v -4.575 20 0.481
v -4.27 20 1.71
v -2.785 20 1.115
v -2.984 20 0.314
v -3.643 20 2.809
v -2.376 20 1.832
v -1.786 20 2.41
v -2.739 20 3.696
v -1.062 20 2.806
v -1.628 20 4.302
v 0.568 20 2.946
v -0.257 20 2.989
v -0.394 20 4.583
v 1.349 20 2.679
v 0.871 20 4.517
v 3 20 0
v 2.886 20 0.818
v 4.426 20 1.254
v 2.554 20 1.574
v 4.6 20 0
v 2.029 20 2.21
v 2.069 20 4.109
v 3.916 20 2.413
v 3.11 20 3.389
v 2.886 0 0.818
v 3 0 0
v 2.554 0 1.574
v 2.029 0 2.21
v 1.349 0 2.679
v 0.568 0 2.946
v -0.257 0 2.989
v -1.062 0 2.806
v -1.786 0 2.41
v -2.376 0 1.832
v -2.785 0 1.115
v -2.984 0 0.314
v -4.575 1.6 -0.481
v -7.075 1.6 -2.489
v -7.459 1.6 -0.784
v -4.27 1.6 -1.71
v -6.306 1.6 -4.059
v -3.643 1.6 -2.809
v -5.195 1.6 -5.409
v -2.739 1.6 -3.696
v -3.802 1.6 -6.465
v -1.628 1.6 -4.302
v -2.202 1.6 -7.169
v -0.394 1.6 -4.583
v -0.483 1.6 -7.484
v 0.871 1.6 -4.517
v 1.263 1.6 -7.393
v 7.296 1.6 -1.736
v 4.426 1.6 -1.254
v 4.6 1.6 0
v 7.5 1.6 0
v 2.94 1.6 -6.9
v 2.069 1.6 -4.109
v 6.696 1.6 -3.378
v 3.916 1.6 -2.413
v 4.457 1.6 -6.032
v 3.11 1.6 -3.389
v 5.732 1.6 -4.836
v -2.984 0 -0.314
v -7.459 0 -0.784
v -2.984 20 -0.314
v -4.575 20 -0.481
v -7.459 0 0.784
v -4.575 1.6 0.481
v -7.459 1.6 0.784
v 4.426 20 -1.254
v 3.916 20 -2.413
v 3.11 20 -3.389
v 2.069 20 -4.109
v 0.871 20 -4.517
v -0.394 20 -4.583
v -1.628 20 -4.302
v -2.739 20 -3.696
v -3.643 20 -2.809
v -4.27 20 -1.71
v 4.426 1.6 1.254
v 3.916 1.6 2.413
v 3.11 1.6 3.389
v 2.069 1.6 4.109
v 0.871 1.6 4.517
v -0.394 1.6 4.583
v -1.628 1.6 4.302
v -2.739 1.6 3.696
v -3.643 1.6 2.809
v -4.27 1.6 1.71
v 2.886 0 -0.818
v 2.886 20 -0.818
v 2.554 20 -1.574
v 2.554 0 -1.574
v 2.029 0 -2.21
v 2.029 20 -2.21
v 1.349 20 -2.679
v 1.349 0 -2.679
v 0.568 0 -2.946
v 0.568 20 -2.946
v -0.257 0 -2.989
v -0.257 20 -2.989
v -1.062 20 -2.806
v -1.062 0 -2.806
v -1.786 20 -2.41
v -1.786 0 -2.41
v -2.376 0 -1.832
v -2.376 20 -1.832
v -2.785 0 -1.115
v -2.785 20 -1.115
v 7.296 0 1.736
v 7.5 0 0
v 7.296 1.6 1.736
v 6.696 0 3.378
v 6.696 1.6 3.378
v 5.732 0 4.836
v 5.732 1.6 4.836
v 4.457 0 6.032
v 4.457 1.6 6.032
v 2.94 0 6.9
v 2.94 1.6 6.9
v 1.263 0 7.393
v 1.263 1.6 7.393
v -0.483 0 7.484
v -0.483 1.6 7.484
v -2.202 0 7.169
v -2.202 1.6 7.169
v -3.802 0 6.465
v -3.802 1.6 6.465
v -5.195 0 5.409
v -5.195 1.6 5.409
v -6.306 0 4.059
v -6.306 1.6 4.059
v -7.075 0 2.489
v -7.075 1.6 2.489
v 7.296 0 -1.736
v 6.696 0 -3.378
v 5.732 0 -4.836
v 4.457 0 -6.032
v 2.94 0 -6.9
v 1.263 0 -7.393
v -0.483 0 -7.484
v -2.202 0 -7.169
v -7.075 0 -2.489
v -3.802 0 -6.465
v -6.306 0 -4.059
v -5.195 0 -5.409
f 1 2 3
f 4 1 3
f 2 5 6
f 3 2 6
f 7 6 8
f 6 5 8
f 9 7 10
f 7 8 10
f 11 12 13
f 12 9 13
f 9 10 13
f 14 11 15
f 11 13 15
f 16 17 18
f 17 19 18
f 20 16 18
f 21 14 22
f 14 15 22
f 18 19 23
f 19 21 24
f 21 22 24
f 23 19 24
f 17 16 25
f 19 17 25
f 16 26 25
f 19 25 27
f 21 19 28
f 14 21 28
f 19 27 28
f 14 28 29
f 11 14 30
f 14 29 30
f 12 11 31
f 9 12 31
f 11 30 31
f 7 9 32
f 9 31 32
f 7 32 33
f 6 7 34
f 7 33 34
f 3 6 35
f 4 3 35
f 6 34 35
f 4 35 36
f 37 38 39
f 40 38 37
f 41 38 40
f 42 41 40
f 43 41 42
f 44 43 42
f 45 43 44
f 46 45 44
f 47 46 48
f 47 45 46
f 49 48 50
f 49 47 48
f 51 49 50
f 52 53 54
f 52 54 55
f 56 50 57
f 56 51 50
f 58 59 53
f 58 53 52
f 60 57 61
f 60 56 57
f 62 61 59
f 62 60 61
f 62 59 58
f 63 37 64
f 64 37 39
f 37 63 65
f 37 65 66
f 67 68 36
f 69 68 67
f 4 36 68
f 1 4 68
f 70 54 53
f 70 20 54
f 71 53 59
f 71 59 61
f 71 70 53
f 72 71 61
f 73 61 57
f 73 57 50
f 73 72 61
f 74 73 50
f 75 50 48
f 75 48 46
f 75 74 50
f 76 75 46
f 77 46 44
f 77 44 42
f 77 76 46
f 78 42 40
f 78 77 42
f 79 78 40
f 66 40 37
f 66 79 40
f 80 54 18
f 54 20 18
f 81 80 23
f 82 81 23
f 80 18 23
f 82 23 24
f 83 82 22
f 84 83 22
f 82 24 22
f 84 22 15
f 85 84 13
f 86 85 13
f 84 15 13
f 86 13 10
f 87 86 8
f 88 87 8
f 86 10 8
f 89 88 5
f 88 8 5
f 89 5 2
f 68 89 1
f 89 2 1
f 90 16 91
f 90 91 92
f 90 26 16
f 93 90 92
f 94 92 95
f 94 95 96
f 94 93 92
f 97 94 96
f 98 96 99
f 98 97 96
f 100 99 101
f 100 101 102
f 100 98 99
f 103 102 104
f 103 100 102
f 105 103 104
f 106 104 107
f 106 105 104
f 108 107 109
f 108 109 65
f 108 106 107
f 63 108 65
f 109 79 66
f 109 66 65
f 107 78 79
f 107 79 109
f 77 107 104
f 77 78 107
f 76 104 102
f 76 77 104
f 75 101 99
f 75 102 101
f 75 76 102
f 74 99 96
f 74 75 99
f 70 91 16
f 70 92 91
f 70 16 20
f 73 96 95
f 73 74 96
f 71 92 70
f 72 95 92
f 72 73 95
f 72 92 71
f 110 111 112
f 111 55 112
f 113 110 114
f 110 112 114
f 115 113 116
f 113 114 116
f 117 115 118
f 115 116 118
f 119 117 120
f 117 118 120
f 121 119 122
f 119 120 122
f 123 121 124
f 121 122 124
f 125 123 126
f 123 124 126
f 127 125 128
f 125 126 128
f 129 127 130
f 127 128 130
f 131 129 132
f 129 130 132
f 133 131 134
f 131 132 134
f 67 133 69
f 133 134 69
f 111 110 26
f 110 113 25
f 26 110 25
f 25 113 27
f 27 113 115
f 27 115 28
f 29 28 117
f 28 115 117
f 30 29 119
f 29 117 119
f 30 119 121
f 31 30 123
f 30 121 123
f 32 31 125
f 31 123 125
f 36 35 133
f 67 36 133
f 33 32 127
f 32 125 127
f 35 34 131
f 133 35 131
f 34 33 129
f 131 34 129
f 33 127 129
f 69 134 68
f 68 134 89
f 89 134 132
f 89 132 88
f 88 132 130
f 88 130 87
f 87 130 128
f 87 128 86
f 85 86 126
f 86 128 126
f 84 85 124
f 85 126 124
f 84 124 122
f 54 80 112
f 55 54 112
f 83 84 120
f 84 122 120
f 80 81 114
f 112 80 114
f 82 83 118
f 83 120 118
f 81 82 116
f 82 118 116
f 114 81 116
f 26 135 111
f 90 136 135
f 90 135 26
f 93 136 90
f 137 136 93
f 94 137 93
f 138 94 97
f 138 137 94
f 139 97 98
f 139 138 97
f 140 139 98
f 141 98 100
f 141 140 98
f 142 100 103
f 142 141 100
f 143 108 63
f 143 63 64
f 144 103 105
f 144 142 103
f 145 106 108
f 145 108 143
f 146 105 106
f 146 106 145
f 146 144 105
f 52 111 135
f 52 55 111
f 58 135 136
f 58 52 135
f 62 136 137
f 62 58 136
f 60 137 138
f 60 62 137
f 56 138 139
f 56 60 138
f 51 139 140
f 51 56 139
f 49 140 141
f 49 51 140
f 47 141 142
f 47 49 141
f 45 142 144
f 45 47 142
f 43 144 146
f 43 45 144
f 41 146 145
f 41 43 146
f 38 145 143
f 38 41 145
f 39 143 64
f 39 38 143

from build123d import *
from build123d.topology import SkipClean

# Parameters (mm, degrees)
REVOLVE1_ANGLE = 348


with BuildPart() as part:
    # Sketch1 → Revolve1 (revolve, symmetric)
    with SkipClean():  # the faces are left unmerged after this step: merging them gives an invalid solid
        with BuildSketch(Plane.XY) as revolve1_sk:
            Polygon((3, 20), (3, 0), (7.5, 0), (7.5, 1.6), (4.6, 1.6), (4.6, 20), align=None)
        revolve(axis=Axis((0, 0, 0), (0, 1, 0)), revolution_arc=REVOLVE1_ANGLE / 2)
        revolve(revolve1_sk.sketch, axis=Axis((0, 0, 0), (0, -1, 0)), revolution_arc=REVOLVE1_ANGLE / 2)
    add(part.part.scale(1), mode=Mode.REPLACE)  # the faces are merged on a copy


solid = part.part
